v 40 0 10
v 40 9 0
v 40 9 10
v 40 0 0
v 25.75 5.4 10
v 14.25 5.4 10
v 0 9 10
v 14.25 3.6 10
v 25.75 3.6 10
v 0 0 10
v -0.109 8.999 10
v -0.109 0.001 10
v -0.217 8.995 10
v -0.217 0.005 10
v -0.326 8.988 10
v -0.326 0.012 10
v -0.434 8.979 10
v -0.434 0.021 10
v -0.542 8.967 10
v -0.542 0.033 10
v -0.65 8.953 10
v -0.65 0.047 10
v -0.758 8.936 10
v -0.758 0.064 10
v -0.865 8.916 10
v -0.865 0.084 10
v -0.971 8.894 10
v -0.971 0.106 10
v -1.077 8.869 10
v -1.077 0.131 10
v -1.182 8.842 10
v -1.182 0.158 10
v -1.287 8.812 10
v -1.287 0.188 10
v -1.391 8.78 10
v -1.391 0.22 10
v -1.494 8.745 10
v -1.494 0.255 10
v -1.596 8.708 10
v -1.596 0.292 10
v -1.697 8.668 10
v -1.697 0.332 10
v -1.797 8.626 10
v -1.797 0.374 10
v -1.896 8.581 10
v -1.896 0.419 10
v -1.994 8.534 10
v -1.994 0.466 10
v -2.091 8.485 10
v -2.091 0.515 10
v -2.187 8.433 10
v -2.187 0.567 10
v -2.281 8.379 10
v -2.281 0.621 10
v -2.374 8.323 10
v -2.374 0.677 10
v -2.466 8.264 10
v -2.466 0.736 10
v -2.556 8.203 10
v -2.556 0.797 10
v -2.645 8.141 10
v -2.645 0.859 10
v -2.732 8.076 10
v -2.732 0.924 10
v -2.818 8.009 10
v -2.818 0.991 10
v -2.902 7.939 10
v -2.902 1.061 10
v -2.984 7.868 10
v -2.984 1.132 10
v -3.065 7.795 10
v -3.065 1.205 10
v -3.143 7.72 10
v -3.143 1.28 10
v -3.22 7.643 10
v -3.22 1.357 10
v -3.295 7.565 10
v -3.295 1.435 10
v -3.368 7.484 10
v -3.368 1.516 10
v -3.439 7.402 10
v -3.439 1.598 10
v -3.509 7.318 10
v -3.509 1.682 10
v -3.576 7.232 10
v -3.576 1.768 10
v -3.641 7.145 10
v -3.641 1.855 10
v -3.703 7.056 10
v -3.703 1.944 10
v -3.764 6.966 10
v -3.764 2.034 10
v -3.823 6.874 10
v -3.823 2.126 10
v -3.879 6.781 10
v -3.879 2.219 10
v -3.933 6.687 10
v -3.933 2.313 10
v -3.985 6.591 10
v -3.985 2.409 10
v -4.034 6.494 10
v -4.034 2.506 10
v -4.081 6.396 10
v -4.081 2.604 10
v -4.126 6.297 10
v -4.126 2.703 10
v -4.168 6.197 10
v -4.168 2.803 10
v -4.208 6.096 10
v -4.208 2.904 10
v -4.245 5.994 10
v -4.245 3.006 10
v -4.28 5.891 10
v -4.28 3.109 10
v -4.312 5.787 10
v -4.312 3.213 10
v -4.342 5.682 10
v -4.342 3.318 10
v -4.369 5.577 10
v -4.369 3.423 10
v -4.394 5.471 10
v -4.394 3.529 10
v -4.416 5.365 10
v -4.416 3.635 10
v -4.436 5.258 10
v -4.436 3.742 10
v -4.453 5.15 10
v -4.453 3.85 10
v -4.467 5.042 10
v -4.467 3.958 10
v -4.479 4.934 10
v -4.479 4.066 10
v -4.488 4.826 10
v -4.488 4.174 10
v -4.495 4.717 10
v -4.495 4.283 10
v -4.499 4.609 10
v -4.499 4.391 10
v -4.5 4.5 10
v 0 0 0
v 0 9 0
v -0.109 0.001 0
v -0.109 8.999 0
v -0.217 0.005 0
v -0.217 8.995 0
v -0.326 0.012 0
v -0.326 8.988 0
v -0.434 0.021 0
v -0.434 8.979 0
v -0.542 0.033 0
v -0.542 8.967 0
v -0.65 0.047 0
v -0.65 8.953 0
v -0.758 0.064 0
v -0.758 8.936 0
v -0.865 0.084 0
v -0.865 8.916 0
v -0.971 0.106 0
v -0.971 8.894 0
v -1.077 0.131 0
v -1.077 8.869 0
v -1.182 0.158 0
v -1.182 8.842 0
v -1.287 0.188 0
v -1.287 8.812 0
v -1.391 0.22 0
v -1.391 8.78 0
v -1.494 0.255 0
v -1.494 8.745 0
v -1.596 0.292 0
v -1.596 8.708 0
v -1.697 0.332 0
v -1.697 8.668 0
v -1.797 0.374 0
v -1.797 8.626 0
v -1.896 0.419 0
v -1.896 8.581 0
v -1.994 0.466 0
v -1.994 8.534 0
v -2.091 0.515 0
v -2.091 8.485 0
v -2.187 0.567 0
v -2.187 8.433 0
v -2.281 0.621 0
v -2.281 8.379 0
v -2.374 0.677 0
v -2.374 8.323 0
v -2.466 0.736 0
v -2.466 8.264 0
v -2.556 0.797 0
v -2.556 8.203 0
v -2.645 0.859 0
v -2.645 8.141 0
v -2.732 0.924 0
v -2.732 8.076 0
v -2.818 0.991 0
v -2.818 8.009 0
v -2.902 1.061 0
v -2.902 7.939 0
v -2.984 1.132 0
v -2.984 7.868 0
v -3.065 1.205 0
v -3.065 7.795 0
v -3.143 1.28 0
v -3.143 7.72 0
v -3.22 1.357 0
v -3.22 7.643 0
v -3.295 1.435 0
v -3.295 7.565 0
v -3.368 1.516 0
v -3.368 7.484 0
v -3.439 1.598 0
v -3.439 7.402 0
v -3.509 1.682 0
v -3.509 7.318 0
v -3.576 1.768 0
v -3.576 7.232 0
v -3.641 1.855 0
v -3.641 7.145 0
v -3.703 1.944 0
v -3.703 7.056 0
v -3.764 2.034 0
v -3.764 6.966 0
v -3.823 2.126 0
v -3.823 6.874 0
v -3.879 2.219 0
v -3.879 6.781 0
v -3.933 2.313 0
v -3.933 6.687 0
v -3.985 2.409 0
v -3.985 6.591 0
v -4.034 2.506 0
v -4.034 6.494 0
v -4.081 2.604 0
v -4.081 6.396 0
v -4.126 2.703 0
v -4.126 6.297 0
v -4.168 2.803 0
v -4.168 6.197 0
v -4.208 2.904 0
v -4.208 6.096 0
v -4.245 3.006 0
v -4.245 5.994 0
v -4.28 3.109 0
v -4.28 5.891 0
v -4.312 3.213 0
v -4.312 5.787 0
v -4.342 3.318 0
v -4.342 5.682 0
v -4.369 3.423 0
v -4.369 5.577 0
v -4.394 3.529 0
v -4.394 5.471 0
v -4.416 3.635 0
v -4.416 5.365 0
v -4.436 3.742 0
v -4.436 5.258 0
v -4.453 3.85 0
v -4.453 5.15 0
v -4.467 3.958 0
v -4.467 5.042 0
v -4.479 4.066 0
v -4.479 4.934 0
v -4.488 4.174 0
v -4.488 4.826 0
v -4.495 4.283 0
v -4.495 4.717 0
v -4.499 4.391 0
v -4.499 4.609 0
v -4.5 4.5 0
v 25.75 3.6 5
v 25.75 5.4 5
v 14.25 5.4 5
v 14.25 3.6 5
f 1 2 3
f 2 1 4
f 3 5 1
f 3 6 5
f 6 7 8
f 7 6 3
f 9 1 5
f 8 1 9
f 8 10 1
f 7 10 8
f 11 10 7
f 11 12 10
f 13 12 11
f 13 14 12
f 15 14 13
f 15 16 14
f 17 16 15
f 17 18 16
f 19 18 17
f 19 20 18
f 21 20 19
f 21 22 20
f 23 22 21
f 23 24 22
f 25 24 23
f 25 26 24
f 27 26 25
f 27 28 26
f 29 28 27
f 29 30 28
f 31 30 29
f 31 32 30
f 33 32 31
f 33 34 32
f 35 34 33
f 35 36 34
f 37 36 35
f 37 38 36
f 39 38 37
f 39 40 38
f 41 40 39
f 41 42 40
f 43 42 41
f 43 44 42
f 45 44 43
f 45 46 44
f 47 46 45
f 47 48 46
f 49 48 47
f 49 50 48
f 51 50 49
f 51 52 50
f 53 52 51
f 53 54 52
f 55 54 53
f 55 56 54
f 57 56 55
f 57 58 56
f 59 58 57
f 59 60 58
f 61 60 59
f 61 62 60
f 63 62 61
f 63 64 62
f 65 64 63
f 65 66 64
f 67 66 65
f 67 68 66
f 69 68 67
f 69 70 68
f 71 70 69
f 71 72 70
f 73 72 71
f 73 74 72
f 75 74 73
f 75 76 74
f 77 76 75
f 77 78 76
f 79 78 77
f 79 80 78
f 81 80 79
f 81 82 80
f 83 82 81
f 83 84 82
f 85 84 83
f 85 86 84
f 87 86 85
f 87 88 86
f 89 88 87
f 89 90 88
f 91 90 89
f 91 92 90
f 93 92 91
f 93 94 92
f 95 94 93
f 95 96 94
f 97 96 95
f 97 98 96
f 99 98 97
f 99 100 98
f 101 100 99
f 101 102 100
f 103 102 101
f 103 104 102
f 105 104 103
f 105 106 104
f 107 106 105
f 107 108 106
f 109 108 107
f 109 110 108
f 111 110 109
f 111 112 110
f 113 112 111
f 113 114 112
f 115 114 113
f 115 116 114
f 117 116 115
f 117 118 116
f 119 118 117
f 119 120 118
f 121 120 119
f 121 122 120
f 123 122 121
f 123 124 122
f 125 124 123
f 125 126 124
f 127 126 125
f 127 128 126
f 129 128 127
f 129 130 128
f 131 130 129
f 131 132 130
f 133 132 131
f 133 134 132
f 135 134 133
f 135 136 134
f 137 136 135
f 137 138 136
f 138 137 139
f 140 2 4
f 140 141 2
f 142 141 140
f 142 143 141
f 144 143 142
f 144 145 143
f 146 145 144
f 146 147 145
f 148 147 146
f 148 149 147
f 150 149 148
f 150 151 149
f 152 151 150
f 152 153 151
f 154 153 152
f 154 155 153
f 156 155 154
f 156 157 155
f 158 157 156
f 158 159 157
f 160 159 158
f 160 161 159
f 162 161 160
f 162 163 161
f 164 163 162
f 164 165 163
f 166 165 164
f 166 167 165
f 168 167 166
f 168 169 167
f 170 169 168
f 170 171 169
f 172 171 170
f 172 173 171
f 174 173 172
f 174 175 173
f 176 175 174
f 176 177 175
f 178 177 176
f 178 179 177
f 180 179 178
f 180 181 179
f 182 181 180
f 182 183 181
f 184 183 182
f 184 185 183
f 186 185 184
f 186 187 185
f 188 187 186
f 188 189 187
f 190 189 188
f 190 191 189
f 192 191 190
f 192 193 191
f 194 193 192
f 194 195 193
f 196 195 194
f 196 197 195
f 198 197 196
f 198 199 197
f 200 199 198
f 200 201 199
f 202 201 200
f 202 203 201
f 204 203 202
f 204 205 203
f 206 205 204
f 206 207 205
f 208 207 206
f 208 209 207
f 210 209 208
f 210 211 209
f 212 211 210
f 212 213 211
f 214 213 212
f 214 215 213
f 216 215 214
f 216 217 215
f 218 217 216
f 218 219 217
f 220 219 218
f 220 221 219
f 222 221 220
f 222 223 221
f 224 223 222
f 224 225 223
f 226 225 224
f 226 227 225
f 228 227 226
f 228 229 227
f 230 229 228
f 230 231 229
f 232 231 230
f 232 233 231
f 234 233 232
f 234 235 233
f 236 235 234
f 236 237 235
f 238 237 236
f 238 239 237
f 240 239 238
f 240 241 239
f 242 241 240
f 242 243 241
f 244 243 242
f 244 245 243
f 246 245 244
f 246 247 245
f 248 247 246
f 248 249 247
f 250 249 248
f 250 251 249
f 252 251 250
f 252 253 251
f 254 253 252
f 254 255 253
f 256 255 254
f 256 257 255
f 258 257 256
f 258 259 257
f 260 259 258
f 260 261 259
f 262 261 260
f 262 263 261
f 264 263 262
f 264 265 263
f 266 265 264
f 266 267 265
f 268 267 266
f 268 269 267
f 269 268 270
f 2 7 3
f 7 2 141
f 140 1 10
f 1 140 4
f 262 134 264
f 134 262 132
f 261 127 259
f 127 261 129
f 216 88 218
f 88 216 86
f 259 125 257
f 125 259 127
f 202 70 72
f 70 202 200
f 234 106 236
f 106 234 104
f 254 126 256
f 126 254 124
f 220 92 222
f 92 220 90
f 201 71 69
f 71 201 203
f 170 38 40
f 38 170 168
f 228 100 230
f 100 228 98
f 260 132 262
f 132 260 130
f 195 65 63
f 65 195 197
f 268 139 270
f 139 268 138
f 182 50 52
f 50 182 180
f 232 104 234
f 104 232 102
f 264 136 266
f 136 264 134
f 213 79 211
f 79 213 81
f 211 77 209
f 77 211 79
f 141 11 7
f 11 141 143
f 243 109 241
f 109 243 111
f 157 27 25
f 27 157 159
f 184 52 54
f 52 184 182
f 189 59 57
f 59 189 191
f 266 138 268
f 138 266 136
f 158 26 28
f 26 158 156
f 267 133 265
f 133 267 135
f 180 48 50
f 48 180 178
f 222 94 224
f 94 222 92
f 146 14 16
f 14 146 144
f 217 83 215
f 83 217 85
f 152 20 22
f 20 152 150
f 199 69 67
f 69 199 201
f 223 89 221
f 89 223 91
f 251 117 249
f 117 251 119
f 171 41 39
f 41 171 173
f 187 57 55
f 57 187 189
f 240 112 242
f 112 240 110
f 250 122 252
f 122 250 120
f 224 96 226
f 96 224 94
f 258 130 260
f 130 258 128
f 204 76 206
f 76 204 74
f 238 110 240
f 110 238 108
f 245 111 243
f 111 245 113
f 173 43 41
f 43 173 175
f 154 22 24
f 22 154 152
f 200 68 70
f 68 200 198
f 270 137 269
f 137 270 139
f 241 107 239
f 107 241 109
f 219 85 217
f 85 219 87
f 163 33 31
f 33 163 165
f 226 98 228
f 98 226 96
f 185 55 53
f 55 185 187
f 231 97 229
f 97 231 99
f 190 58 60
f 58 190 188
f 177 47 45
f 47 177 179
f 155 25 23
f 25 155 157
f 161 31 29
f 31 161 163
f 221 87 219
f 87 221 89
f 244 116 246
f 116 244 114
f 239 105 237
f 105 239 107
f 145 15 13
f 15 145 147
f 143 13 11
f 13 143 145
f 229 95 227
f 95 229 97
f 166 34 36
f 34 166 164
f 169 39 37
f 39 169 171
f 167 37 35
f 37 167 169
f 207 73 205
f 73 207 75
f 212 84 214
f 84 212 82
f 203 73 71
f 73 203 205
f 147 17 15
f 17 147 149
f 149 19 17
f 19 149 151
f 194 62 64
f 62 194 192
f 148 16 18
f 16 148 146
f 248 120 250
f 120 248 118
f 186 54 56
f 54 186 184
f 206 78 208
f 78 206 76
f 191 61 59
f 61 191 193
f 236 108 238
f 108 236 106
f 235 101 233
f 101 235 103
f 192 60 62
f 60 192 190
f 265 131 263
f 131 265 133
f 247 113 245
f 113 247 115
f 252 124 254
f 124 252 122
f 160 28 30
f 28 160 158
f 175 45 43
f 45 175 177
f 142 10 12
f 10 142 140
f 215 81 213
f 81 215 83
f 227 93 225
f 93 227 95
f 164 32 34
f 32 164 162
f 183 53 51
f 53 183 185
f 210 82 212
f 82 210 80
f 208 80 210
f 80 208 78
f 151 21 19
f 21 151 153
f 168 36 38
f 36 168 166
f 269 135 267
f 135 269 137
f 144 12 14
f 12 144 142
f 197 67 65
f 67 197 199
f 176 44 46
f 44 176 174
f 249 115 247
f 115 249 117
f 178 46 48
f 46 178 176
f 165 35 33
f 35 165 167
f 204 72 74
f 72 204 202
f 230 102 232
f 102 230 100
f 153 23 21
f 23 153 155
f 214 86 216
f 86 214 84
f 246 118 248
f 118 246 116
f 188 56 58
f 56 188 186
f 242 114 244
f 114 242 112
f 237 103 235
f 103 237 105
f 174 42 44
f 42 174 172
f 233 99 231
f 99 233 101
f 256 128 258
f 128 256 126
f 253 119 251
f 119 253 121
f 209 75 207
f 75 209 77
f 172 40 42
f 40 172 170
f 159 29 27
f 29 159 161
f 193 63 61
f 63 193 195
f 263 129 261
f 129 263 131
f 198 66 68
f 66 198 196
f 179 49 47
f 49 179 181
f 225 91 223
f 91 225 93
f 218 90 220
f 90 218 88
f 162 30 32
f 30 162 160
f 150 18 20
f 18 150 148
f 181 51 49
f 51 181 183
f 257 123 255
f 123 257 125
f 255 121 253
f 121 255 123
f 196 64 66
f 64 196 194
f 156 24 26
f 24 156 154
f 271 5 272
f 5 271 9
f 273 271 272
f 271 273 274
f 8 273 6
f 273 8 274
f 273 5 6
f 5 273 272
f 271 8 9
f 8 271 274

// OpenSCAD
// Real Lonely T-Rex Game: Cactus Carrier
// Copyright (C) 2017, Uri Shaked and Ariella Eliassaf

$fn=260;

body_length = 40;
body_width = 9;
body_height = 10;

hole_length = 11.5;
hole_width = 1.8;
hole_depth = 5;

difference() {
    union() {
        cube([body_length,body_width,body_height]);
        
        translate([0,body_width/2,0])
        cylinder(r=body_width/2,h=body_height);
    }
    
    translate([(body_length-hole_length)/2,(body_width-hole_width)/2,body_height-hole_depth])
    cube([hole_length,hole_width,body_height]);
}
